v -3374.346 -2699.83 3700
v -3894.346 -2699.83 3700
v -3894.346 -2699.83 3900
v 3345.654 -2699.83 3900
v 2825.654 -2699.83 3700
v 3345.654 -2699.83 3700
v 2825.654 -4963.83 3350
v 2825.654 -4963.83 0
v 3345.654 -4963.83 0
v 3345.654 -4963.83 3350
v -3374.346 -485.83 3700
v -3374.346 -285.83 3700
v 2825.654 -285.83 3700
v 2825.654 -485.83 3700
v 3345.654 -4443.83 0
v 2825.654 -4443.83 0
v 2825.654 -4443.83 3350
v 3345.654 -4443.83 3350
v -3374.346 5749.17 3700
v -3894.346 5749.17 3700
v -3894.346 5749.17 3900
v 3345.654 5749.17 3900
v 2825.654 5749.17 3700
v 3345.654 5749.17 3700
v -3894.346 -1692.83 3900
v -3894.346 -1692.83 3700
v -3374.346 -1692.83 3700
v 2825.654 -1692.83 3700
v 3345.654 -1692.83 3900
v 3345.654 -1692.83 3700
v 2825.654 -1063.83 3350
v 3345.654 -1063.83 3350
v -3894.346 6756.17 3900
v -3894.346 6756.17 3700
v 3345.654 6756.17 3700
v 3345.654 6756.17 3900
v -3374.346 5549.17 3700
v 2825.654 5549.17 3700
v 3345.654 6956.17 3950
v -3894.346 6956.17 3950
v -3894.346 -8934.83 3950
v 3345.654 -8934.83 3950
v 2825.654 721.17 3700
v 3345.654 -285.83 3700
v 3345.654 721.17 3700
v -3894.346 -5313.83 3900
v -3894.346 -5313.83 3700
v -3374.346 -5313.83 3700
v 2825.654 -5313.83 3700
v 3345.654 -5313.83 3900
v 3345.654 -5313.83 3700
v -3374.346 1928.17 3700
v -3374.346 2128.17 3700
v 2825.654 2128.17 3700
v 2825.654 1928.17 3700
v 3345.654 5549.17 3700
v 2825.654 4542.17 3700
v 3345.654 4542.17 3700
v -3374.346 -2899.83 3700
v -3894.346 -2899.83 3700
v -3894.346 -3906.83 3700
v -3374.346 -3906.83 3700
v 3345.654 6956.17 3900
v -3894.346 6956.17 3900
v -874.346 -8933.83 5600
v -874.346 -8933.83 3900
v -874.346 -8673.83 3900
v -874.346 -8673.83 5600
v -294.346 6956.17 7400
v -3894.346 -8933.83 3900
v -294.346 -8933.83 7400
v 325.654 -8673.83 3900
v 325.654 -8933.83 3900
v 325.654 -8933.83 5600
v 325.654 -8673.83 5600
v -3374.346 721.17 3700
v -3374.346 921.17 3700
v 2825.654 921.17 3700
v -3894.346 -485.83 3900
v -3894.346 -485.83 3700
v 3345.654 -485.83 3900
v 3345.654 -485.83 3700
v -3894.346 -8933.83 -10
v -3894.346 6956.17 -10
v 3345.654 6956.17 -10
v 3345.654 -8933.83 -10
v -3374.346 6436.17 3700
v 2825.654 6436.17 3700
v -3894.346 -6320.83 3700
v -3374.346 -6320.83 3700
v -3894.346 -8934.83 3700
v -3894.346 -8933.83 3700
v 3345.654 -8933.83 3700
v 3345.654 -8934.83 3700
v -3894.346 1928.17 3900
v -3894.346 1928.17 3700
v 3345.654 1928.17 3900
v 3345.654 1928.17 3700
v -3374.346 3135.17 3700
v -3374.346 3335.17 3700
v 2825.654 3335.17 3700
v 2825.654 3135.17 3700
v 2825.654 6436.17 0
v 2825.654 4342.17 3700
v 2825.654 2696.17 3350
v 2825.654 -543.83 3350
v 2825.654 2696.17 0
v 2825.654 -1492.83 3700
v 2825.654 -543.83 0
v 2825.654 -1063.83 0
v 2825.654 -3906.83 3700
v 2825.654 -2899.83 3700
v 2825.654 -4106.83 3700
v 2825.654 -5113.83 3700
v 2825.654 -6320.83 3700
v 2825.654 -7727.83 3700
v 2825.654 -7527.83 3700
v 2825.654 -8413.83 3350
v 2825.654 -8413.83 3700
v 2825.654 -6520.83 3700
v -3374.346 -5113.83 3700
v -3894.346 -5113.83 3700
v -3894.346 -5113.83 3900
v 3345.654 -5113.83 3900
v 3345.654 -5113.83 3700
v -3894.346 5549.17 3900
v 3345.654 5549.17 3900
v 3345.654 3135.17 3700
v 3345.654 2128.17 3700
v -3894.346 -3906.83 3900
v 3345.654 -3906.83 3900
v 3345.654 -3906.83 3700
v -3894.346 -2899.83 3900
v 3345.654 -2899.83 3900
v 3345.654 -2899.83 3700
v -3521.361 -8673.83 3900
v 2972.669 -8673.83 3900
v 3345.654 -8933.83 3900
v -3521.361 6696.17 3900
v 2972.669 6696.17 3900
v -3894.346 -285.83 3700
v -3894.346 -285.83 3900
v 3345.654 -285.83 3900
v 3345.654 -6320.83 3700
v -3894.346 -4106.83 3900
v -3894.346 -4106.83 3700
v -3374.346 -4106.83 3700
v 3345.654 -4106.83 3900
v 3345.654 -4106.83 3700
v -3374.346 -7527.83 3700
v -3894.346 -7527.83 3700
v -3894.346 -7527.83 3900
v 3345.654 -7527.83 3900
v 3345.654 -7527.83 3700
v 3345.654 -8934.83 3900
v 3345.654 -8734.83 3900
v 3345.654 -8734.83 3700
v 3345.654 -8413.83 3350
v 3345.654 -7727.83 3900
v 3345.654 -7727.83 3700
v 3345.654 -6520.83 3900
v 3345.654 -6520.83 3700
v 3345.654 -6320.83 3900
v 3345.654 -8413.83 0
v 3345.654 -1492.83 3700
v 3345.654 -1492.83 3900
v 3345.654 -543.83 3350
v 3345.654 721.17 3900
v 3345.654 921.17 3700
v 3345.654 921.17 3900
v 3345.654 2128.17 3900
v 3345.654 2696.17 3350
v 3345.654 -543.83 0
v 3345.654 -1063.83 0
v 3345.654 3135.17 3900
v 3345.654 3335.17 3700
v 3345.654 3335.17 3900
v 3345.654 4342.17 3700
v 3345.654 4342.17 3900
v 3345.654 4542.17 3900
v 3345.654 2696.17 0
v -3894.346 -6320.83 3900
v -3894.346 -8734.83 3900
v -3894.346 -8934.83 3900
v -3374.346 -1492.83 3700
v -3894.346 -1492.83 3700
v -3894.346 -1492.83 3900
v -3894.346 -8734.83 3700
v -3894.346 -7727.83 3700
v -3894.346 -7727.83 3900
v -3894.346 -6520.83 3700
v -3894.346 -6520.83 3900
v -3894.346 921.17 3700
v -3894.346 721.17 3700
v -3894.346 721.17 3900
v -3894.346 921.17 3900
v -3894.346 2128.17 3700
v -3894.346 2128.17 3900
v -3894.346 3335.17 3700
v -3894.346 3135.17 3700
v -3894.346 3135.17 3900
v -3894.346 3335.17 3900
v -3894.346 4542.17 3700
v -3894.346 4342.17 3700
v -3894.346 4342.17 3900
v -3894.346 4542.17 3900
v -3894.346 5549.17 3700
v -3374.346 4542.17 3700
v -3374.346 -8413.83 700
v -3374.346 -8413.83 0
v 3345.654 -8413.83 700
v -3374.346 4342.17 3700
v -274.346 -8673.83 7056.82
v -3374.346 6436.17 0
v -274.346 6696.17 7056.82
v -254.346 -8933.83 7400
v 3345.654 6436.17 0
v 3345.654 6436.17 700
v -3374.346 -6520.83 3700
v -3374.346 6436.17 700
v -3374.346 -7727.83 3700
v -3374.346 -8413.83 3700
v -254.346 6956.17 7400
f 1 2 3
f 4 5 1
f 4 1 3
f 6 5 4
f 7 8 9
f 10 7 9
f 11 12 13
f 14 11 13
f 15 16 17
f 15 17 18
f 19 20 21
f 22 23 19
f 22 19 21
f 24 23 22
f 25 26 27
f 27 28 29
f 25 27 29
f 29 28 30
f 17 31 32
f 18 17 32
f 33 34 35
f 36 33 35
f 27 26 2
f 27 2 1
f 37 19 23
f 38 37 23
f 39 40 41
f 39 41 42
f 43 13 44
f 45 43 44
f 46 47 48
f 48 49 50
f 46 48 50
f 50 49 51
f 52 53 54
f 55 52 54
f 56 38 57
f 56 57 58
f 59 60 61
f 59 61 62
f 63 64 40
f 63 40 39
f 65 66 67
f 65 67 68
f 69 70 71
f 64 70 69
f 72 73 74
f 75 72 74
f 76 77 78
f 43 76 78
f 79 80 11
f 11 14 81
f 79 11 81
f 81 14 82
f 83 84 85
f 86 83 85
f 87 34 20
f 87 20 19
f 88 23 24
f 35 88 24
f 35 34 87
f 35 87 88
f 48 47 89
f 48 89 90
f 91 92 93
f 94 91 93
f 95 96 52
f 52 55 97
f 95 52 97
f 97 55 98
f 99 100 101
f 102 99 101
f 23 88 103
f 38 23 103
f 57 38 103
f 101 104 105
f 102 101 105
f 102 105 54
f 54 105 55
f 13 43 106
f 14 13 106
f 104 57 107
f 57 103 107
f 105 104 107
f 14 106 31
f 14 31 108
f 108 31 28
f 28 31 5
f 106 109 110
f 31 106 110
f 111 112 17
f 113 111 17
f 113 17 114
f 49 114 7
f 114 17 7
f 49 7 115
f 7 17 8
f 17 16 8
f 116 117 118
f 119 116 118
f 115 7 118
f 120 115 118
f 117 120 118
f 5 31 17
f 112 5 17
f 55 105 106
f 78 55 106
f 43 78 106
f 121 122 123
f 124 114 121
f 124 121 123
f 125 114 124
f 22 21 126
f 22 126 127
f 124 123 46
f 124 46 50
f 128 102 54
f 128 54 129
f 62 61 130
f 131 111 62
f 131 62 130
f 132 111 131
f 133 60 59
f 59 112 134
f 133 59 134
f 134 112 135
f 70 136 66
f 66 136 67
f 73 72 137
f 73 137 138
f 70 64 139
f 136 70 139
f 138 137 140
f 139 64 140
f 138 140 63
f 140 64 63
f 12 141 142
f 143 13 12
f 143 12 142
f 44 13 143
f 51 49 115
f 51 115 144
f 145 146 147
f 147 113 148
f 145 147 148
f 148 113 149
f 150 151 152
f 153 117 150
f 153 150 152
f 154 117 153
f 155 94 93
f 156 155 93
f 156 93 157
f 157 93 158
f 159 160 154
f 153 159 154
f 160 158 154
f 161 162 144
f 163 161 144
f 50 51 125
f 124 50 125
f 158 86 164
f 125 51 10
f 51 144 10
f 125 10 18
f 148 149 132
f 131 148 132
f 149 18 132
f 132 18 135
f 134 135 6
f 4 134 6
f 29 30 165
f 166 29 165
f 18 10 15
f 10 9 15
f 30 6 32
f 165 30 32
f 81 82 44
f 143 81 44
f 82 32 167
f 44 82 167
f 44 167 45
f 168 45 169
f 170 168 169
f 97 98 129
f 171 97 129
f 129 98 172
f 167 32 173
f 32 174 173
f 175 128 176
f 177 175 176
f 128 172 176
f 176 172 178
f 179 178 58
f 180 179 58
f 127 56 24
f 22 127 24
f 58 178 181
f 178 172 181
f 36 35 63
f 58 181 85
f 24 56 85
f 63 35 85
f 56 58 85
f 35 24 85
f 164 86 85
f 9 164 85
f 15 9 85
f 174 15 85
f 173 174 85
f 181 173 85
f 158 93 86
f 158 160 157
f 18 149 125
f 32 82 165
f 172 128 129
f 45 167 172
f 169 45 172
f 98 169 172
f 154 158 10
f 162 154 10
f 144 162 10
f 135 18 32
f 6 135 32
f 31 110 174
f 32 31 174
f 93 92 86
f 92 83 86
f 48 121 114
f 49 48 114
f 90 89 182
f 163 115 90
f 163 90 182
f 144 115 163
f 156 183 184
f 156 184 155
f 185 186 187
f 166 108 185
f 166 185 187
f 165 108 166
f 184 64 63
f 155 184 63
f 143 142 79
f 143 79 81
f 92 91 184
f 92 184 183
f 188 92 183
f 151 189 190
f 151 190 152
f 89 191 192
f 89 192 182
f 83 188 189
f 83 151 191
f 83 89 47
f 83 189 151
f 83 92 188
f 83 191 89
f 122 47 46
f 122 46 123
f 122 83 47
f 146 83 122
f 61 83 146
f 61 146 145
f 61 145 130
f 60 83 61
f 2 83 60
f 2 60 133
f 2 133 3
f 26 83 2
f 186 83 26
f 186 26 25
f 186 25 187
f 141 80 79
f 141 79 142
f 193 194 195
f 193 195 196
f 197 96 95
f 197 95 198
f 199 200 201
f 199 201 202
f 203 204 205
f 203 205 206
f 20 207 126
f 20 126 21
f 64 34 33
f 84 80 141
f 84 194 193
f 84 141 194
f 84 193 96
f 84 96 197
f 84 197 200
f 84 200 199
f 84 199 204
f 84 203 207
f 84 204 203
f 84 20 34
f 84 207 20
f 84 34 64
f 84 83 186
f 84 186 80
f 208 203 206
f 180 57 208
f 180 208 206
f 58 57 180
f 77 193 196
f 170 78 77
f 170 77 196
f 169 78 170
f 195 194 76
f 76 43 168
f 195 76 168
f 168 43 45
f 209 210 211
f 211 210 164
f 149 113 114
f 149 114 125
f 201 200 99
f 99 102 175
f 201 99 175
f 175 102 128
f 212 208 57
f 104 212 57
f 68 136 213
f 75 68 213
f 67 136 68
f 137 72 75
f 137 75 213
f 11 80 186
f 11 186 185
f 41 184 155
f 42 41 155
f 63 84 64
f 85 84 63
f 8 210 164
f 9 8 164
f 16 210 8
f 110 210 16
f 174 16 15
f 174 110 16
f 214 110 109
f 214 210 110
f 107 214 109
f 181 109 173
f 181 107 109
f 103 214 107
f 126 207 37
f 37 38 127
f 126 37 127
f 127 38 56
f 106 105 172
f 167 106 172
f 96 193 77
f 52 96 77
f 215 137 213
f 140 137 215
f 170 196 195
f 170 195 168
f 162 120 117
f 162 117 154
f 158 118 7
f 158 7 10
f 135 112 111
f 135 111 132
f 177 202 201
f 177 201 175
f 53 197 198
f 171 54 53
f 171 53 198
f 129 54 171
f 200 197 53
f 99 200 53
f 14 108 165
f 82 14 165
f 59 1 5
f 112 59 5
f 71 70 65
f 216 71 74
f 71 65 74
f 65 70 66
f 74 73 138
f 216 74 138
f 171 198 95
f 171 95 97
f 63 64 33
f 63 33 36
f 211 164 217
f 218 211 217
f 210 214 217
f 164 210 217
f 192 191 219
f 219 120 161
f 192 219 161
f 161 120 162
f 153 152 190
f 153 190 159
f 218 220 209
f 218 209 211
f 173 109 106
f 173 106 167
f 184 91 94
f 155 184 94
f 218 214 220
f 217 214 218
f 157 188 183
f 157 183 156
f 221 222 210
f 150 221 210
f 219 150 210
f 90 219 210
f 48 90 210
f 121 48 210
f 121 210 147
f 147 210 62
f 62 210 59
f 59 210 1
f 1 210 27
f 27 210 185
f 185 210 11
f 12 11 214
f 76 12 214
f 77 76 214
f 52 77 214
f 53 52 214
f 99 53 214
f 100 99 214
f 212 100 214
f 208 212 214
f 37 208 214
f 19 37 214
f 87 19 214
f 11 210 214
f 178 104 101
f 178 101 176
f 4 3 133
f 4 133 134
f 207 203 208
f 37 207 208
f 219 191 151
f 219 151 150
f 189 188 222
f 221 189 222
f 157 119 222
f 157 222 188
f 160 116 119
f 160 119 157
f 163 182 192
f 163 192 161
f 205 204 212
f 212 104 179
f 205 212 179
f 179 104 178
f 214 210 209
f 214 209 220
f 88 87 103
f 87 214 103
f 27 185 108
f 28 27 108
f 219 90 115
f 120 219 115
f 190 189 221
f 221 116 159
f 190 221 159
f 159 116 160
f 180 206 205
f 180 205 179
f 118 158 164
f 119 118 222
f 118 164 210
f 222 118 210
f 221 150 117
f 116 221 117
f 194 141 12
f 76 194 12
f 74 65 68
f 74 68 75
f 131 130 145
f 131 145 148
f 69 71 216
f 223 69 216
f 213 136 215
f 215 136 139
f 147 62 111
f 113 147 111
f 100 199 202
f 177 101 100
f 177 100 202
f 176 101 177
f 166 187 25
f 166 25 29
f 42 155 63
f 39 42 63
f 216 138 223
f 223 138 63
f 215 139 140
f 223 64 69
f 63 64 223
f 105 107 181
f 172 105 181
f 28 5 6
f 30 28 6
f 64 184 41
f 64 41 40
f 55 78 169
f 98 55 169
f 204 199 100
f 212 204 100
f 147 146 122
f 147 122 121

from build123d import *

# Parameters (mm, degrees)
F0_W      = 520
F0_H      = 3240
F0_H_2    = 520
F0_H_3    = 3380
F0_H_4    = 3450
F1_DEPTH  = 10
F2_DEPTH  = 3350
F3_W      = 520
F3_H      = 11110
F4_DEPTH  = 350
F5_W      = 7240
F5_H      = 200
F6_DEPTH  = 200
F7_W      = 7240
F7_H      = 15890
F8_DEPTH  = 3500
F9_SIZE2  = 3499.99999
F9_SIZE   = 3599.99999
F10_T     = 260
F11_W     = 1200
F11_H     = 1700
F12_DEPTH = 260
F13_W     = 6720
F13_H     = 14850
F14_DEPTH = 700
F15_W     = 7240
F15_H     = 15891
F16_DEPTH = 50


# Not quite as in the source:
# - a fillet or chamfer is up to 0.001 mm smaller than in the source, because OpenCascade refuses the exact size
# - a shell that OpenCascade refuses in one call is made with other operations: the cavity is built on its own and cut out


with BuildPart() as f1:
    # F0 (on Top) → F1 (new body)
    with BuildSketch(Plane.XY):
        Polygon((-3374.345998764, -8413.8299859681), (-3374.345998764, 6436.1700140319), (2825.654001236, 6436.1700140319), (2825.654001236, 2696.170014032), (3345.654001236, 2696.170014032), (3345.654001236, 6956.1700140319), (-3894.345998764, 6956.1700140319), (-3894.345998764, -8933.8299859681), (3345.654001236, -8933.8299859681), (3345.654001236, -8413.8299859681), (2825.654001236, -8413.8299859681), align=None)
        Polygon((2825.654001236, 6436.1700140319), (-3374.345998764, 6436.1700140319), (-3374.345998764, -8413.8299859681), (2825.654001236, -8413.8299859681), (2825.654001236, -4963.8299859681), (2825.654001236, -4443.829985968), (2825.654001236, -1063.8299859681), (2825.654001236, -543.829985968), (2825.654001236, 2696.170014032), align=None)
        with Locations((3085.654001236, 1076.170014032)):
            Rectangle(F0_W, F0_H)
        with Locations((3085.654001236, -803.829985968)):
            Rectangle(F0_W, F0_H_2)
        with Locations((3085.654001236, -2753.829985968)):
            Rectangle(F0_W, F0_H_3)
        with Locations((3085.654001236, -6688.8299859681)):
            Rectangle(F0_W, F0_H_4)
        with Locations((3085.654001236, -4703.8299859681)):
            Rectangle(F0_W, F0_H_2)
    extrude(amount=-F1_DEPTH)

    # F0 (on Top) → F2 (join)
    with BuildSketch(Plane.XY):
        with Locations((3085.654001236, -803.829985968)):
            Rectangle(F0_W, F0_H_2)
        with Locations((3085.654001236, -4703.8299859681)):
            Rectangle(F0_W, F0_H_2)
        Polygon((-3374.345998764, -8413.8299859681), (-3374.345998764, 6436.1700140319), (2825.654001236, 6436.1700140319), (2825.654001236, 2696.170014032), (3345.654001236, 2696.170014032), (3345.654001236, 6956.1700140319), (-3894.345998764, 6956.1700140319), (-3894.345998764, -8933.8299859681), (3345.654001236, -8933.8299859681), (3345.654001236, -8413.8299859681), (2825.654001236, -8413.8299859681), align=None)
    extrude(amount=F2_DEPTH)

    # F3 (on face) → F4 (join)
    with BuildSketch(Plane.XY.offset(3350)):
        Polygon((3345.654001236, 6956.1700140319), (-3894.345998764, 6956.1700140319), (-3894.345998764, -8933.8299859681), (3345.654001236, -8933.8299859681), (3345.654001236, -8413.8299859681), (2825.654001236, -8413.8299859681), (-3374.345998764, -8413.8299859681), (-3374.345998764, 6436.1700140319), (2825.654001236, 6436.1700140319), (2825.654001236, 2696.170014032), (3345.654001236, 2696.170014032), align=None)
        with Locations((3085.654001236, -2858.8299859681)):
            Rectangle(F3_W, F3_H)
    extrude(amount=F4_DEPTH)

    # F5 (on face) → F6 (join)
    with BuildSketch(Plane.XY.offset(3700)):
        with Locations((-274.345998764, 6856.1700140319)):
            Rectangle(F5_W, F5_H)
        with Locations((-274.345998764, 5649.1700140319)):
            Rectangle(F5_W, F5_H)
        with Locations((-274.345998764, 4442.1700140319)):
            Rectangle(F5_W, F5_H)
        with Locations((-274.345998764, 3235.1700140319)):
            Rectangle(F5_W, F5_H)
        with Locations((-274.345998764, 2028.1700140319)):
            Rectangle(F5_W, F5_H)
        with Locations((-274.345998764, 821.1700140319)):
            Rectangle(F5_W, F5_H)
        with Locations((-274.345998764, -385.8299859681)):
            Rectangle(F5_W, F5_H)
        with Locations((-274.345998764, -1592.8299859681)):
            Rectangle(F5_W, F5_H)
        with Locations((-274.345998764, -2799.8299859681)):
            Rectangle(F5_W, F5_H)
        with Locations((-274.345998764, -4006.8299859681)):
            Rectangle(F5_W, F5_H)
        with Locations((-274.345998764, -5213.8299859681)):
            Rectangle(F5_W, F5_H)
        with Locations((-274.345998764, -6420.8299859681)):
            Rectangle(F5_W, F5_H)
        with Locations((-274.345998764, -7627.8299859681)):
            Rectangle(F5_W, F5_H)
        with Locations((-274.345998764, -8834.8299859681)):
            Rectangle(F5_W, F5_H)
    extrude(amount=F6_DEPTH)


with BuildPart() as f8:
    # F7 (on face) → F8 (new body)
    with BuildSketch(Plane.XY.offset(3900)):
        with Locations((-274.345998764, -988.8299859681)):
            Rectangle(F7_W, F7_H)
    extrude(amount=F8_DEPTH)

    # F9 (size 3600 and 3500 in the source; OpenCascade refuses exactly that, so slightly less here)
    f9_edges = [f8.edges().sort_by_distance(p)[0] for p in [
        (-3894.345999, -988.829986, 7400),
        (3345.654001, -988.829986, 7400),
    ]]
    f9_side = f8.faces().sort_by_distance((-274.345999, -988.829986, 7400))[0]
    chamfer(f9_edges, length=F9_SIZE, length2=F9_SIZE2, reference=f9_side)

    # F10: shell of thickness 260, made by hand


with BuildPart() as f10_core1:
    # F10_t2: copy of F8
    add(f8.part)

    # the walls: a layer under each face that stays
    f10_faces = [f10_core1.faces().sort_by_distance(p)[0] for p in [
        (-274.3459987642, -8933.8299859681, 5650.0000000001),
        (-3894.345998764, -988.8299859681, 3900.0000050002),
        (-2094.3460037642, -988.8299859681, 5650.0000050002),
        (-274.345998764, -988.8299859681, 7400),
        (3345.654001236, -988.8299859681, 3900.0000050002),
        (1545.6540062361, -988.8299859681, 5650.0000050002),
        (-274.3459987639, 6956.1700140319, 5650.0000000001),
    ]]
    thicken(f10_faces, amount=-F10_T, mode=Mode.SUBTRACT)


with BuildPart() as f8_1:
    add(f8.part)

    # what is left inside the walls is the cavity
    f10_cavity = [f10_core1.part.solids().sort_by_distance(p)[0] for p in [
        (-274.345999, -3550.496653, 3902.6),
    ]]
    add(f10_cavity, mode=Mode.SUBTRACT)

    # F11 (on face) → F12 (cut)
    with BuildSketch(Plane.XZ.offset(8933.8299859681)):
        with Locations((-274.345998764, 4750)):
            Rectangle(F11_W, F11_H)
    extrude(amount=-F12_DEPTH, mode=Mode.SUBTRACT)


with BuildPart() as f14:
    # F13 (on face) → F14 (new body)
    with BuildSketch(Plane.XY):
        with Locations((-14.345998764, -988.8299859681)):
            Rectangle(F13_W, F13_H)
    extrude(amount=F14_DEPTH)


with BuildPart() as f16:
    # F15 (on face) → F16 (new body)
    with BuildSketch(Plane.XY.offset(3900)):
        with Locations((-274.345998764, -989.3299859681)):
            Rectangle(F15_W, F15_H)
    extrude(amount=F16_DEPTH)


solid = Compound([f1.part, f8_1.part, f14.part, f16.part])
